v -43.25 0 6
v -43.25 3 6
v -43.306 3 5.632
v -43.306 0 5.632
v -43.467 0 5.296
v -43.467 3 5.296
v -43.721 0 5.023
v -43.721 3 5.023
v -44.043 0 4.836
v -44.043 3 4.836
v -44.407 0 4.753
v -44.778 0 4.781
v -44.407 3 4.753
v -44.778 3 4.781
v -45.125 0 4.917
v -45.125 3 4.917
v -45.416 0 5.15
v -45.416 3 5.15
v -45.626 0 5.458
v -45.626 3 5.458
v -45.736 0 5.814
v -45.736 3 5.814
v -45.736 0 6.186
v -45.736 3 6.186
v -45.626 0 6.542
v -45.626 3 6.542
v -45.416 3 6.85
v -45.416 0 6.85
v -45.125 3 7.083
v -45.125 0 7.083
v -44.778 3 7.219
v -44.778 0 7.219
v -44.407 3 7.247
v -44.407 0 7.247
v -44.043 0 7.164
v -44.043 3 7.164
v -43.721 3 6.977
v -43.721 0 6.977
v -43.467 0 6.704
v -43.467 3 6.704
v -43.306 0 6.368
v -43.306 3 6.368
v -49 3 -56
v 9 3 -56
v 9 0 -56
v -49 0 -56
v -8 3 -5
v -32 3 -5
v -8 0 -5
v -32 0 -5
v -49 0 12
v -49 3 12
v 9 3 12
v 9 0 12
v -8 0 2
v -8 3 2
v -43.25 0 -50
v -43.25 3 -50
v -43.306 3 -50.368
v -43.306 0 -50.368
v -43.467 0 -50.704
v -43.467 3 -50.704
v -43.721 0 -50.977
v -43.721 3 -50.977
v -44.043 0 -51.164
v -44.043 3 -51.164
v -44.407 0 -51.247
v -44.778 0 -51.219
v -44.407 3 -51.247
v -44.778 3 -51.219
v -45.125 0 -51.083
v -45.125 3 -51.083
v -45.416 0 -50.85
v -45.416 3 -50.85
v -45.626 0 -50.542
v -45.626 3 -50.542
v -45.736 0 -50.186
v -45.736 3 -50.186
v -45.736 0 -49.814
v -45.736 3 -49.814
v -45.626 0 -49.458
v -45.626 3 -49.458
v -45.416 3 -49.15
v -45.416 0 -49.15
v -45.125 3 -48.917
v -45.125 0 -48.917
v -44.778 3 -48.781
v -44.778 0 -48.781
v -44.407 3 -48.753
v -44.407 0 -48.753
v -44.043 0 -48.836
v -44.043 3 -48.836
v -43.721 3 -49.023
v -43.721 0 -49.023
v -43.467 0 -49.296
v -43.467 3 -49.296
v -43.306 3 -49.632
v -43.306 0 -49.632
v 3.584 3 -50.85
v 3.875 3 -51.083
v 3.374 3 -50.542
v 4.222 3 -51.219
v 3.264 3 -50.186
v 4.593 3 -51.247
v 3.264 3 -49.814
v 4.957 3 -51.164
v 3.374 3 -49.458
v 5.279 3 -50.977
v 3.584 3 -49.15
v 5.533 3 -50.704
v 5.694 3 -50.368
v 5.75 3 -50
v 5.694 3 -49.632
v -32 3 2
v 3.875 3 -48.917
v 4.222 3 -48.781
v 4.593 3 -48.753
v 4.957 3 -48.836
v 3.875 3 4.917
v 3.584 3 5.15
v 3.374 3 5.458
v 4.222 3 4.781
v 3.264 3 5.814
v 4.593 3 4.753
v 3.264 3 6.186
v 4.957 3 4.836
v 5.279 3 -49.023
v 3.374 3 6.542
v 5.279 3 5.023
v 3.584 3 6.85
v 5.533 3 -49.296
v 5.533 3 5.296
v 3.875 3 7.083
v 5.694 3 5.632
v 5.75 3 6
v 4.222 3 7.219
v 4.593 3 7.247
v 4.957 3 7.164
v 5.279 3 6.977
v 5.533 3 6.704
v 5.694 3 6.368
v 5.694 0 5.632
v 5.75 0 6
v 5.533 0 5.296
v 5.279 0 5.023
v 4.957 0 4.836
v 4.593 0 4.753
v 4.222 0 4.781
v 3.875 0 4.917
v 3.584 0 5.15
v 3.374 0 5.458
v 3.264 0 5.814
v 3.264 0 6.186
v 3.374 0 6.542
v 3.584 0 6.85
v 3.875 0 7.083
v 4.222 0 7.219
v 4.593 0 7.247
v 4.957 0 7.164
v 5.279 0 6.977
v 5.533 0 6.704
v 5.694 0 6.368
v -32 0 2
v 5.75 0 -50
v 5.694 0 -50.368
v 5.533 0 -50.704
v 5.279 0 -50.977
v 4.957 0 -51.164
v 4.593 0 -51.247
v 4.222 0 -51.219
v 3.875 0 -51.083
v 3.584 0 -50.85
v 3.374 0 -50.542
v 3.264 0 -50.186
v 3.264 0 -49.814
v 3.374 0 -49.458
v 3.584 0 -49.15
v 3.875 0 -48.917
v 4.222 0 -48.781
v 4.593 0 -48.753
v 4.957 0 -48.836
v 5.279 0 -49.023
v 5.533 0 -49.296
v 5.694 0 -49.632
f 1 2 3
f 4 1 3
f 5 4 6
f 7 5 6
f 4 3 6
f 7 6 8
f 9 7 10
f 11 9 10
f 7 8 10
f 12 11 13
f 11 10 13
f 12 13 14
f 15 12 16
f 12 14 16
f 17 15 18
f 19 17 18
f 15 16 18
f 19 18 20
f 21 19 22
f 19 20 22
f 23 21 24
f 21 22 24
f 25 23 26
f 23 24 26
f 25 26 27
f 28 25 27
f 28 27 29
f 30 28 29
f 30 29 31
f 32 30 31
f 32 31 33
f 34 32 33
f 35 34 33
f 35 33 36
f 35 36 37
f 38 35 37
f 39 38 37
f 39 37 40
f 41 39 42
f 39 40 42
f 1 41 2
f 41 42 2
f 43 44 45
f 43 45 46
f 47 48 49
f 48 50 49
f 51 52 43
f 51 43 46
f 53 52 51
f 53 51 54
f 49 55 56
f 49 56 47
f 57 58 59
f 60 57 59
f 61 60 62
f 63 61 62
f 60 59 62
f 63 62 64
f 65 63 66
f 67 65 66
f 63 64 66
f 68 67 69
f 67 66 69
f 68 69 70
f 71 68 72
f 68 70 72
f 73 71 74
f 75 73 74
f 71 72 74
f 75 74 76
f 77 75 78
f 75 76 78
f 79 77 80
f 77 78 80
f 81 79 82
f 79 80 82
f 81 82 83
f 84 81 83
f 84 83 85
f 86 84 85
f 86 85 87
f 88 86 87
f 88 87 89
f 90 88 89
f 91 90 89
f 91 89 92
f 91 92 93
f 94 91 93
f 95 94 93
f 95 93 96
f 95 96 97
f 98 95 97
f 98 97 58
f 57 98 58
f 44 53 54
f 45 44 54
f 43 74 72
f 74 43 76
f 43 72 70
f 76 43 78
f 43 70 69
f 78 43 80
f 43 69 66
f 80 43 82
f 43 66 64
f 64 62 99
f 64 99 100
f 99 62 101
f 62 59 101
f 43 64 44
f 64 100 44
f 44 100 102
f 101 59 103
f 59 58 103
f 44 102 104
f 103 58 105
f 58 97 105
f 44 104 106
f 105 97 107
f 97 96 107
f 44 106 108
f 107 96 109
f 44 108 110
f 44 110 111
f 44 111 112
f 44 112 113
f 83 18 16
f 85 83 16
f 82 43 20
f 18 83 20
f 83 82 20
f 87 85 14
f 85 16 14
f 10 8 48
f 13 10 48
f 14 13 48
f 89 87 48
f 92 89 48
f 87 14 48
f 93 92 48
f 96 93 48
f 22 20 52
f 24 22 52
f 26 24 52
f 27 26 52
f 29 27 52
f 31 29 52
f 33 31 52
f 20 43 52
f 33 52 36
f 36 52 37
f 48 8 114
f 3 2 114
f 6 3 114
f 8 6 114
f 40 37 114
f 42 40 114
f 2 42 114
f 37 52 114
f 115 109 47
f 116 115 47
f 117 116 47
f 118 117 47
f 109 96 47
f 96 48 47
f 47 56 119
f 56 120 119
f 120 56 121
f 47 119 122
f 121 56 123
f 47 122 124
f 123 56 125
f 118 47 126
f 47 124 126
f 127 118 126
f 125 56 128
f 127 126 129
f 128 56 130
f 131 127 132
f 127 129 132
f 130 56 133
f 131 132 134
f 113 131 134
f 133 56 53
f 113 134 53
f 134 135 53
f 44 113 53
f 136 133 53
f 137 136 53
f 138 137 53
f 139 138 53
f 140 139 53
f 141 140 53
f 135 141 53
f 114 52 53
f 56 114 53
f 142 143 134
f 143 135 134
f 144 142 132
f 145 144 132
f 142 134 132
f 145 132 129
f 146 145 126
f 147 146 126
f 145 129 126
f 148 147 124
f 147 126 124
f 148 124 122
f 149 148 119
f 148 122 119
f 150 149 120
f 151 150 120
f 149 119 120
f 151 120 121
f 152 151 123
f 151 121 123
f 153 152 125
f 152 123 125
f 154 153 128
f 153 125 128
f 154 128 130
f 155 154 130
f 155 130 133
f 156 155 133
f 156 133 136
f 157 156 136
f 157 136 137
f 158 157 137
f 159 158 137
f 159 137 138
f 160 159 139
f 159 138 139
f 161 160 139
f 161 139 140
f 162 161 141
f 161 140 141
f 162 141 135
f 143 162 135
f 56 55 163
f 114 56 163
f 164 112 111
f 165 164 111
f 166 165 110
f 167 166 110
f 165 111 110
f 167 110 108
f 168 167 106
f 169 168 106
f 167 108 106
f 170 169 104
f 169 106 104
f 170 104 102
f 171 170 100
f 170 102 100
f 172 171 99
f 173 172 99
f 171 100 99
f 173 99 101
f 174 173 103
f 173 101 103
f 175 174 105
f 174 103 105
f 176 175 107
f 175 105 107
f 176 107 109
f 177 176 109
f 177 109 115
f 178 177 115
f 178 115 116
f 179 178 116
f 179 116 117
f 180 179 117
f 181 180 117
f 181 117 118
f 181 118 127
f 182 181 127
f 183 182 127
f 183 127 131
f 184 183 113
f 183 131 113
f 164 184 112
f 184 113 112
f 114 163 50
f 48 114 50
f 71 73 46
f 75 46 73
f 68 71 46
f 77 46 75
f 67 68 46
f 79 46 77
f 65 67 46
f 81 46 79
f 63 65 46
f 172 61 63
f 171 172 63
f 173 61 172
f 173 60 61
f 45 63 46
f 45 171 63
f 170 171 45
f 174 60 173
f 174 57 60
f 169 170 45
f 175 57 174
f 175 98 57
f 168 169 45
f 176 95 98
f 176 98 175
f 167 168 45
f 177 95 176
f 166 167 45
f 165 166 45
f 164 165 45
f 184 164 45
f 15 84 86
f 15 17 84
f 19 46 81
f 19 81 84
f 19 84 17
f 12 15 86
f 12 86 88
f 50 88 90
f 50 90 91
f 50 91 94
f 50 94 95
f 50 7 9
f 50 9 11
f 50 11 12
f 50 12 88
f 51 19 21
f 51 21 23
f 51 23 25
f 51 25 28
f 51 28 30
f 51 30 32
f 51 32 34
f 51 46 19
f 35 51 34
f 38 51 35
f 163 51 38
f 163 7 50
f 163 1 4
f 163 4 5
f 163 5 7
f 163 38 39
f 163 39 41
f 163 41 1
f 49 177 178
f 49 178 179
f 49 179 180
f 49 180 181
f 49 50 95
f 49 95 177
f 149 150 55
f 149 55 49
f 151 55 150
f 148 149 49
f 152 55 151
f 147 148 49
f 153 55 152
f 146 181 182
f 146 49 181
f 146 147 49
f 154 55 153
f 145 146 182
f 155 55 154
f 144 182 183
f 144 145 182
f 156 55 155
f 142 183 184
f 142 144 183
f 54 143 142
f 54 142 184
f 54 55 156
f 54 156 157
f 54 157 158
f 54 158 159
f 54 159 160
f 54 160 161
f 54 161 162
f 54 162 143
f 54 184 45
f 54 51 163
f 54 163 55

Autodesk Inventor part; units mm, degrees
ref_plane "YZ Plane" through (0, 0, 0) normal (1, 0, 0) x (0, 1, 0)
ref_plane "XZ Plane" through (0, 0, 0) normal (0, 1, 0) x (-1, 0, 0)
ref_plane "XY Plane" through (0, 0, 0) normal (0, 0, 1) x (1, 0, 0)
sketch "Sketch2" plane through (0, 0, 0) normal (0, 1, 0) x (-1, 0, 0)
  line L0 (8, 0) -> (8, -5)
  line L1 (32, 0) -> (32, -5)
  line L2 (32, -5) -> (8, -5)
  line L3 (8, -5) -> (8, 0)
  line L4 (32, 0) -> (32, -5)
  line L5 (-9, 0) -> (-9, 9)
  line L6 (-9, 9) -> (0, 9)
  line L7 (49, -44) -> (49, -53)
  line L8 (49, -53) -> (40, -53)
  line L9 (-9, 9) -> (49, 9)
  line L10 (49, 9) -> (49, -53)
  line L11 (49, -53) -> (-9, -53)
  line L12 (-9, -53) -> (-9, 9)
  line L13 (8, 0) -> (8, 2)
  line L14 (8, 2) -> (32, 2)
  line L15 (32, 2) -> (32, 0)
  line L16 (32, 2) -> (8, 2)
  line L17 (8, 2) -> (8, -5)
  line L18 (8, -5) -> (32, -5)
  line L19 (32, -5) -> (32, 2)
  point P0 (0, 0)
extrude "Extrusion1" add sketch "Sketch2" along normal blind 3
sketch "Sketch3" plane through (-49, 0, 9) normal (0, 0, 1) x (1, 0, 0)
  line L0 (0, 0) -> (0, 3) projected
  line L1 (58, 0) -> (58, 3) projected
  line L2 (0, 3) -> (58, 3)
  line L3 (58, 3) -> (58, 0)
  line L4 (58, 0) -> (0, 0)
  line L5 (0, 0) -> (0, 3)
  point P0 (49, 0)
extrude "Extrusion2" add sketch "Sketch3" along normal blind 3
sketch "Sketch4" plane through (9, 0, -53) normal (0, 0, -1) x (-1, 0, 0)
  line L0 (58, 3) -> (58, 0) projected
  line L1 (58, 0) -> (0, 0) projected
  line L2 (58, 3) -> (0, 3)
  line L3 (0, 3) -> (0, 0)
  line L4 (0, 0) -> (58, 0)
  line L5 (58, 0) -> (58, 3)
  point P0 (9, 0)
extrude "Extrusion3" add sketch "Sketch4" along normal blind 3
sketch "Sketch5" plane through (0, 3, 0) normal (0, 1, 0) x (1, 0, 0)
  line L0 (9, -12) -> (0, -12)
  line L1 (0, -12) -> (0, 0)
  line L2 (0, 0) -> (9, 0)
  line L3 (9, 0) -> (9, -12)
  line L4 (-49, -12) -> (-49, 56) projected
  line L5 (-49, 56) -> (-40, 56)
  line L6 (-40, 56) -> (-40, 44)
  line L7 (-40, 44) -> (-49, 44)
  line L8 (-49, 44) -> (-49, 56)
  line L9 (9, 56) -> (0, 56)
  line L10 (0, 56) -> (0, 44)
  line L11 (0, 44) -> (9, 44)
  line L12 (9, 44) -> (9, 56)
  circle A0 centre (-44.5, 50) radius 1.25
  circle A1 centre (4.5, 50) radius 1.25
  circle A2 centre (4.5, -6) radius 1.25
  line L13 (-49, -12) -> (-40, -12)
  line L14 (-40, -12) -> (-40, 0)
  line L15 (-40, 0) -> (-49, 0)
  line L16 (-49, 0) -> (-49, -12)
  circle A3 centre (-44.5, -6) radius 1.25
  dimension "d16" = 9
  dimension "d17" = 12
  dimension "d18" = 9
  dimension "d19" = 12
  dimension "d21" = 2.5
  dimension "d22" = 2.5
  dimension "d23" = 2.5
  dimension "d24" = 2.5
extrude "Extrusion4" cut sketch "Sketch5" against normal blind 5 contours A0 | A1 | A2 | A3
properties part number "Podkladka"
